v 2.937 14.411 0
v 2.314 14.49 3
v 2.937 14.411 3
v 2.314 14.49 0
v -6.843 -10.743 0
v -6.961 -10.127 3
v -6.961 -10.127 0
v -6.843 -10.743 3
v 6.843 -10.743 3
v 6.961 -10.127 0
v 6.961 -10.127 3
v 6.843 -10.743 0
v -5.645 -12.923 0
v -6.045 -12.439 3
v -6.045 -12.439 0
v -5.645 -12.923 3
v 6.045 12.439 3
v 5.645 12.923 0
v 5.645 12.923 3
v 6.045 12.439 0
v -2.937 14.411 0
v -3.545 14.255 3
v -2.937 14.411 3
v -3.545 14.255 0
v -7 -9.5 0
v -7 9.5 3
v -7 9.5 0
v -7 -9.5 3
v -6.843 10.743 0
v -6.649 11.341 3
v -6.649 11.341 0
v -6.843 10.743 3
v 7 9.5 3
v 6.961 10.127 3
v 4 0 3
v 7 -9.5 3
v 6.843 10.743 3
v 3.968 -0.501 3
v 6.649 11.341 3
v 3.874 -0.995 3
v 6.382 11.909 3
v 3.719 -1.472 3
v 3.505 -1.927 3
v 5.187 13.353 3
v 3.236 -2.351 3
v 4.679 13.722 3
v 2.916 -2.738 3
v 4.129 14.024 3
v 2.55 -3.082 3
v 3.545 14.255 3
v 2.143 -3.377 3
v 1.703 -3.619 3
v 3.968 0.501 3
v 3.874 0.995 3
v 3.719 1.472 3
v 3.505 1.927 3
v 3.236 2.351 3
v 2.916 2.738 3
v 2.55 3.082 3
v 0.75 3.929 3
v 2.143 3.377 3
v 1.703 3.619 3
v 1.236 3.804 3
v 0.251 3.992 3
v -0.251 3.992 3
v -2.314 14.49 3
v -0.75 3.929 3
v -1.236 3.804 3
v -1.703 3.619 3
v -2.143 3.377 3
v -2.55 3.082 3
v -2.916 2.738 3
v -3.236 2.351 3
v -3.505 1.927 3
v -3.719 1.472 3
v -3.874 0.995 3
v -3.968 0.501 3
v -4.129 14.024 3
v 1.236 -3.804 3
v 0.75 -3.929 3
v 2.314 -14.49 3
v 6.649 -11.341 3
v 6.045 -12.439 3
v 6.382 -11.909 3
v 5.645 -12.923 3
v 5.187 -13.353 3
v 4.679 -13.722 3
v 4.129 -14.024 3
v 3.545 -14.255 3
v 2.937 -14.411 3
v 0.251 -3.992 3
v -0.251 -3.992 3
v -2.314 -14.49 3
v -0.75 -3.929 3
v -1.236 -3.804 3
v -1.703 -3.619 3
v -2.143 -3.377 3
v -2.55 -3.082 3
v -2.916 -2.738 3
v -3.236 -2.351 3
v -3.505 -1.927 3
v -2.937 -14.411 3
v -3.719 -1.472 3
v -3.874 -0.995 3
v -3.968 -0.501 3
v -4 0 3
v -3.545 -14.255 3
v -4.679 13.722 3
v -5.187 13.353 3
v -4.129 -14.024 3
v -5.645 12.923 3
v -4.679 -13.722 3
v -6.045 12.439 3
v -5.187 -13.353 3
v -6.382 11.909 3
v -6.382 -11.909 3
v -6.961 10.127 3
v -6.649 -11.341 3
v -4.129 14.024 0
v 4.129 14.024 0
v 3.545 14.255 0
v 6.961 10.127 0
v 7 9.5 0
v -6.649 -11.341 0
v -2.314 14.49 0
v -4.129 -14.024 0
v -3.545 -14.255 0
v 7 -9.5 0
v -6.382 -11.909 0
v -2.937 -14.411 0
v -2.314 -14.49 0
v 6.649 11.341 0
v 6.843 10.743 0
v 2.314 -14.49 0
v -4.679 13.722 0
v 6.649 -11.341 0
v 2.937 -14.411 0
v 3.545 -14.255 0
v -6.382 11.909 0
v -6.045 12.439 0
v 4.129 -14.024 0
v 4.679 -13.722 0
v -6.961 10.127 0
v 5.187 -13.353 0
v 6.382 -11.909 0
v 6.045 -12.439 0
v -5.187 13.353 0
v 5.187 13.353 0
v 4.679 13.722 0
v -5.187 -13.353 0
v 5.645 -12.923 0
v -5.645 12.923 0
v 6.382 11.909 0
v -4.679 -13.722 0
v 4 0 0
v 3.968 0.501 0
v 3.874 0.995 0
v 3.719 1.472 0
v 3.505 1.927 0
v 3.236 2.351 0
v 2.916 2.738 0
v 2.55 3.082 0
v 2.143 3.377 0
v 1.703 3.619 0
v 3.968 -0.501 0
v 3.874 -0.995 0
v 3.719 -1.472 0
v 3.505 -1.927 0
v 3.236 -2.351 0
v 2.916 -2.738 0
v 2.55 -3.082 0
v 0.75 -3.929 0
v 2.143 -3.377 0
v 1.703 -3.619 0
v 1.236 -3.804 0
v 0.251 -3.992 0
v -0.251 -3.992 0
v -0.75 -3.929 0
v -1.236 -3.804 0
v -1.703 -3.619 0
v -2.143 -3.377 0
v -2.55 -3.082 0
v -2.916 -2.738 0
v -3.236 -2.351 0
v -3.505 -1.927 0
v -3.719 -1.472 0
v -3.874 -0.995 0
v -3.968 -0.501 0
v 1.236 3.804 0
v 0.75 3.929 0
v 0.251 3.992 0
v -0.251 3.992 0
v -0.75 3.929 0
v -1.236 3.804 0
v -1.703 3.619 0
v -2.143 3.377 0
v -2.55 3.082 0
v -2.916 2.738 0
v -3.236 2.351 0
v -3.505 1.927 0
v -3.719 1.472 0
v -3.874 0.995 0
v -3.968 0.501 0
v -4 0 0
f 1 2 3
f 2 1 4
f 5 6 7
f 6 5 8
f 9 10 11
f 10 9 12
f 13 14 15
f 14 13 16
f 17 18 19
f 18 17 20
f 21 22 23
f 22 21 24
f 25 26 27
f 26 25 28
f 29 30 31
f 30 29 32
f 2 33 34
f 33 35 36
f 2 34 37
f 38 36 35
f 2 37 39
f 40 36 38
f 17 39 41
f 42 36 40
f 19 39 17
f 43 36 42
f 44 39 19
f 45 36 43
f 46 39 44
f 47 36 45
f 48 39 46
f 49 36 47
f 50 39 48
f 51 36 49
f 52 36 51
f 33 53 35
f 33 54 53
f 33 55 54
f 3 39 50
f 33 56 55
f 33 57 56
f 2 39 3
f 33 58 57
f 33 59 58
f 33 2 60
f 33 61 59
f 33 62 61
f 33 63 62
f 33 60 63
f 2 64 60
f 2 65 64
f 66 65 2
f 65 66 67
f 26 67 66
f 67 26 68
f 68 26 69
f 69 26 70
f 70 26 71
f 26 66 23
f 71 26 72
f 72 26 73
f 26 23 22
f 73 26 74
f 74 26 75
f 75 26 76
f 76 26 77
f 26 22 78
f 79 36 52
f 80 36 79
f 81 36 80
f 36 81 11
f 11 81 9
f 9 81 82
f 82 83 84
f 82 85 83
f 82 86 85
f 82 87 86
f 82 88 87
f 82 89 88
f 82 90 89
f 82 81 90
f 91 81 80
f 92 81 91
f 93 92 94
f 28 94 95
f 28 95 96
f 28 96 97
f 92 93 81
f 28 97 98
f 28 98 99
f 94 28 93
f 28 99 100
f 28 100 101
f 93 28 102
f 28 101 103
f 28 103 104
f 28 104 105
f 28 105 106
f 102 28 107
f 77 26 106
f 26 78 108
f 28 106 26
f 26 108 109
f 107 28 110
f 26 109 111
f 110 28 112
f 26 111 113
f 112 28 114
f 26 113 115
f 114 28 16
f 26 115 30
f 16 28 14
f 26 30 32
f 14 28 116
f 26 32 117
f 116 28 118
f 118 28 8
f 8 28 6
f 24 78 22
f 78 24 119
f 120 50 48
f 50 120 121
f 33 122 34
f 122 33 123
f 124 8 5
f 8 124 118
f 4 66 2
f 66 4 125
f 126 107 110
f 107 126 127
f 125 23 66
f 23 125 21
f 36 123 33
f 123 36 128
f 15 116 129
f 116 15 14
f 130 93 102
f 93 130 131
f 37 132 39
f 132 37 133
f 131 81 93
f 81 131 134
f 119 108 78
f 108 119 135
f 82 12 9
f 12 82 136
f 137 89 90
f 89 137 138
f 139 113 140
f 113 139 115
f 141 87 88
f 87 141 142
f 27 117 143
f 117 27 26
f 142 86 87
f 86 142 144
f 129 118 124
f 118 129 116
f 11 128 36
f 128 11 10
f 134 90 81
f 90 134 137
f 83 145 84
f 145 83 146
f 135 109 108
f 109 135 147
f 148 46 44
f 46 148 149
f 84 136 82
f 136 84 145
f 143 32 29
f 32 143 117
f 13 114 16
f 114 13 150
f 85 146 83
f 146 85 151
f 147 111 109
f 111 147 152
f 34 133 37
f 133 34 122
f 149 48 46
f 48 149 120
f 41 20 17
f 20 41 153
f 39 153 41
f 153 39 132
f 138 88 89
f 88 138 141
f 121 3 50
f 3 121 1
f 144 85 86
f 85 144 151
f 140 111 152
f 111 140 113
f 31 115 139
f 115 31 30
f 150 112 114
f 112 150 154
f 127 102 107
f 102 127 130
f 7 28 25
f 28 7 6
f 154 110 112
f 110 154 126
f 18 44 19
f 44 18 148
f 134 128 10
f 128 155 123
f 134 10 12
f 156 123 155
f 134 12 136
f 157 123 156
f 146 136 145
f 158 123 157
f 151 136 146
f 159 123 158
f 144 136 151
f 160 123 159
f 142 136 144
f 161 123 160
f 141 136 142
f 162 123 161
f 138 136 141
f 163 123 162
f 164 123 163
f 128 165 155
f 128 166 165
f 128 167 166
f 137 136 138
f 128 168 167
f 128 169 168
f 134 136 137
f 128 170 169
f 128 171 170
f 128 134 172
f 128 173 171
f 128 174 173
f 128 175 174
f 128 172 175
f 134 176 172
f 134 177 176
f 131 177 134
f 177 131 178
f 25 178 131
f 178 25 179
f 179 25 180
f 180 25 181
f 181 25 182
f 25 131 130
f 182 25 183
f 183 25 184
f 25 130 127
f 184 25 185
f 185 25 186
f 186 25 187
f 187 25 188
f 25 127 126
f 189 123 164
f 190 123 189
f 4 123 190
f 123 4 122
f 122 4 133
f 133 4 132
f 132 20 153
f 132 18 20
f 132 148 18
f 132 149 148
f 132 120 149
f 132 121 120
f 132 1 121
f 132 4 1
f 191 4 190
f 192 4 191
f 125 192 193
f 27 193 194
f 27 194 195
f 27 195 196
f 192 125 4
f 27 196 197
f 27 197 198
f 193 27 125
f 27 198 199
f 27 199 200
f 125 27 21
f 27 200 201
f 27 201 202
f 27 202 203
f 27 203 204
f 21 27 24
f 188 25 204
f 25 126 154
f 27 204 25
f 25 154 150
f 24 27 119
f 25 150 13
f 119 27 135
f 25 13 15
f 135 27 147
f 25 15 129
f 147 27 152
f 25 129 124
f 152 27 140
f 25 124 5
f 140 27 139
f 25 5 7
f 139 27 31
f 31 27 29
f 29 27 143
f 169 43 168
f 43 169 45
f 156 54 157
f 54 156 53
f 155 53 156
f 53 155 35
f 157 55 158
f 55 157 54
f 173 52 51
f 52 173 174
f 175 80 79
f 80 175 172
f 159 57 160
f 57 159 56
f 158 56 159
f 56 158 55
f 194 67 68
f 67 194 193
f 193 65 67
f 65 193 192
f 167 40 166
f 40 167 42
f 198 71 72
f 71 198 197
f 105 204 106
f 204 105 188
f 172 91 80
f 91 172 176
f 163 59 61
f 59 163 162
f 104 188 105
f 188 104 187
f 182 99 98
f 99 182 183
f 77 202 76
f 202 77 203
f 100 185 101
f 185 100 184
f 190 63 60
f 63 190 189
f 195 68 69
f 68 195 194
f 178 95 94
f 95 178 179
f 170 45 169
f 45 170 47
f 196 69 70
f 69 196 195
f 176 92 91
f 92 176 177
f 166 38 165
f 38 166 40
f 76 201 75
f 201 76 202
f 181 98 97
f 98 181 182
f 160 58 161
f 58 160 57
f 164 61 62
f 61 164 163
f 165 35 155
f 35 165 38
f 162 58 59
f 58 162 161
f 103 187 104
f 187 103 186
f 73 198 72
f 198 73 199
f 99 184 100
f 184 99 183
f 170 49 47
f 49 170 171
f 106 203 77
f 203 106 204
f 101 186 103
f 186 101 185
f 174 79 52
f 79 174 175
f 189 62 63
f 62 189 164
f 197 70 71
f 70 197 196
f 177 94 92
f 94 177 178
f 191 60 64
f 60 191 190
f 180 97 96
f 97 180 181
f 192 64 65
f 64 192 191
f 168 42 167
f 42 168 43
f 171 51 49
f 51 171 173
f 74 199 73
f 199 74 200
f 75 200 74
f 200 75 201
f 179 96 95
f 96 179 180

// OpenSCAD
$fn = 50;

difference() {
	union() {
		hull() {
			translate(v = [-2.0, 9.5, 0]) {
				cylinder(h = 3, r = 5);
			}
			translate(v = [2.0, 9.5, 0]) {
				cylinder(h = 3, r = 5);
			}
			translate(v = [-2.0, -9.5, 0]) {
				cylinder(h = 3, r = 5);
			}
			translate(v = [2.0, -9.5, 0]) {
				cylinder(h = 3, r = 5);
			}
		}
	}
	union() {
		cylinder(h = 3, r = 4.0);
	}
}
